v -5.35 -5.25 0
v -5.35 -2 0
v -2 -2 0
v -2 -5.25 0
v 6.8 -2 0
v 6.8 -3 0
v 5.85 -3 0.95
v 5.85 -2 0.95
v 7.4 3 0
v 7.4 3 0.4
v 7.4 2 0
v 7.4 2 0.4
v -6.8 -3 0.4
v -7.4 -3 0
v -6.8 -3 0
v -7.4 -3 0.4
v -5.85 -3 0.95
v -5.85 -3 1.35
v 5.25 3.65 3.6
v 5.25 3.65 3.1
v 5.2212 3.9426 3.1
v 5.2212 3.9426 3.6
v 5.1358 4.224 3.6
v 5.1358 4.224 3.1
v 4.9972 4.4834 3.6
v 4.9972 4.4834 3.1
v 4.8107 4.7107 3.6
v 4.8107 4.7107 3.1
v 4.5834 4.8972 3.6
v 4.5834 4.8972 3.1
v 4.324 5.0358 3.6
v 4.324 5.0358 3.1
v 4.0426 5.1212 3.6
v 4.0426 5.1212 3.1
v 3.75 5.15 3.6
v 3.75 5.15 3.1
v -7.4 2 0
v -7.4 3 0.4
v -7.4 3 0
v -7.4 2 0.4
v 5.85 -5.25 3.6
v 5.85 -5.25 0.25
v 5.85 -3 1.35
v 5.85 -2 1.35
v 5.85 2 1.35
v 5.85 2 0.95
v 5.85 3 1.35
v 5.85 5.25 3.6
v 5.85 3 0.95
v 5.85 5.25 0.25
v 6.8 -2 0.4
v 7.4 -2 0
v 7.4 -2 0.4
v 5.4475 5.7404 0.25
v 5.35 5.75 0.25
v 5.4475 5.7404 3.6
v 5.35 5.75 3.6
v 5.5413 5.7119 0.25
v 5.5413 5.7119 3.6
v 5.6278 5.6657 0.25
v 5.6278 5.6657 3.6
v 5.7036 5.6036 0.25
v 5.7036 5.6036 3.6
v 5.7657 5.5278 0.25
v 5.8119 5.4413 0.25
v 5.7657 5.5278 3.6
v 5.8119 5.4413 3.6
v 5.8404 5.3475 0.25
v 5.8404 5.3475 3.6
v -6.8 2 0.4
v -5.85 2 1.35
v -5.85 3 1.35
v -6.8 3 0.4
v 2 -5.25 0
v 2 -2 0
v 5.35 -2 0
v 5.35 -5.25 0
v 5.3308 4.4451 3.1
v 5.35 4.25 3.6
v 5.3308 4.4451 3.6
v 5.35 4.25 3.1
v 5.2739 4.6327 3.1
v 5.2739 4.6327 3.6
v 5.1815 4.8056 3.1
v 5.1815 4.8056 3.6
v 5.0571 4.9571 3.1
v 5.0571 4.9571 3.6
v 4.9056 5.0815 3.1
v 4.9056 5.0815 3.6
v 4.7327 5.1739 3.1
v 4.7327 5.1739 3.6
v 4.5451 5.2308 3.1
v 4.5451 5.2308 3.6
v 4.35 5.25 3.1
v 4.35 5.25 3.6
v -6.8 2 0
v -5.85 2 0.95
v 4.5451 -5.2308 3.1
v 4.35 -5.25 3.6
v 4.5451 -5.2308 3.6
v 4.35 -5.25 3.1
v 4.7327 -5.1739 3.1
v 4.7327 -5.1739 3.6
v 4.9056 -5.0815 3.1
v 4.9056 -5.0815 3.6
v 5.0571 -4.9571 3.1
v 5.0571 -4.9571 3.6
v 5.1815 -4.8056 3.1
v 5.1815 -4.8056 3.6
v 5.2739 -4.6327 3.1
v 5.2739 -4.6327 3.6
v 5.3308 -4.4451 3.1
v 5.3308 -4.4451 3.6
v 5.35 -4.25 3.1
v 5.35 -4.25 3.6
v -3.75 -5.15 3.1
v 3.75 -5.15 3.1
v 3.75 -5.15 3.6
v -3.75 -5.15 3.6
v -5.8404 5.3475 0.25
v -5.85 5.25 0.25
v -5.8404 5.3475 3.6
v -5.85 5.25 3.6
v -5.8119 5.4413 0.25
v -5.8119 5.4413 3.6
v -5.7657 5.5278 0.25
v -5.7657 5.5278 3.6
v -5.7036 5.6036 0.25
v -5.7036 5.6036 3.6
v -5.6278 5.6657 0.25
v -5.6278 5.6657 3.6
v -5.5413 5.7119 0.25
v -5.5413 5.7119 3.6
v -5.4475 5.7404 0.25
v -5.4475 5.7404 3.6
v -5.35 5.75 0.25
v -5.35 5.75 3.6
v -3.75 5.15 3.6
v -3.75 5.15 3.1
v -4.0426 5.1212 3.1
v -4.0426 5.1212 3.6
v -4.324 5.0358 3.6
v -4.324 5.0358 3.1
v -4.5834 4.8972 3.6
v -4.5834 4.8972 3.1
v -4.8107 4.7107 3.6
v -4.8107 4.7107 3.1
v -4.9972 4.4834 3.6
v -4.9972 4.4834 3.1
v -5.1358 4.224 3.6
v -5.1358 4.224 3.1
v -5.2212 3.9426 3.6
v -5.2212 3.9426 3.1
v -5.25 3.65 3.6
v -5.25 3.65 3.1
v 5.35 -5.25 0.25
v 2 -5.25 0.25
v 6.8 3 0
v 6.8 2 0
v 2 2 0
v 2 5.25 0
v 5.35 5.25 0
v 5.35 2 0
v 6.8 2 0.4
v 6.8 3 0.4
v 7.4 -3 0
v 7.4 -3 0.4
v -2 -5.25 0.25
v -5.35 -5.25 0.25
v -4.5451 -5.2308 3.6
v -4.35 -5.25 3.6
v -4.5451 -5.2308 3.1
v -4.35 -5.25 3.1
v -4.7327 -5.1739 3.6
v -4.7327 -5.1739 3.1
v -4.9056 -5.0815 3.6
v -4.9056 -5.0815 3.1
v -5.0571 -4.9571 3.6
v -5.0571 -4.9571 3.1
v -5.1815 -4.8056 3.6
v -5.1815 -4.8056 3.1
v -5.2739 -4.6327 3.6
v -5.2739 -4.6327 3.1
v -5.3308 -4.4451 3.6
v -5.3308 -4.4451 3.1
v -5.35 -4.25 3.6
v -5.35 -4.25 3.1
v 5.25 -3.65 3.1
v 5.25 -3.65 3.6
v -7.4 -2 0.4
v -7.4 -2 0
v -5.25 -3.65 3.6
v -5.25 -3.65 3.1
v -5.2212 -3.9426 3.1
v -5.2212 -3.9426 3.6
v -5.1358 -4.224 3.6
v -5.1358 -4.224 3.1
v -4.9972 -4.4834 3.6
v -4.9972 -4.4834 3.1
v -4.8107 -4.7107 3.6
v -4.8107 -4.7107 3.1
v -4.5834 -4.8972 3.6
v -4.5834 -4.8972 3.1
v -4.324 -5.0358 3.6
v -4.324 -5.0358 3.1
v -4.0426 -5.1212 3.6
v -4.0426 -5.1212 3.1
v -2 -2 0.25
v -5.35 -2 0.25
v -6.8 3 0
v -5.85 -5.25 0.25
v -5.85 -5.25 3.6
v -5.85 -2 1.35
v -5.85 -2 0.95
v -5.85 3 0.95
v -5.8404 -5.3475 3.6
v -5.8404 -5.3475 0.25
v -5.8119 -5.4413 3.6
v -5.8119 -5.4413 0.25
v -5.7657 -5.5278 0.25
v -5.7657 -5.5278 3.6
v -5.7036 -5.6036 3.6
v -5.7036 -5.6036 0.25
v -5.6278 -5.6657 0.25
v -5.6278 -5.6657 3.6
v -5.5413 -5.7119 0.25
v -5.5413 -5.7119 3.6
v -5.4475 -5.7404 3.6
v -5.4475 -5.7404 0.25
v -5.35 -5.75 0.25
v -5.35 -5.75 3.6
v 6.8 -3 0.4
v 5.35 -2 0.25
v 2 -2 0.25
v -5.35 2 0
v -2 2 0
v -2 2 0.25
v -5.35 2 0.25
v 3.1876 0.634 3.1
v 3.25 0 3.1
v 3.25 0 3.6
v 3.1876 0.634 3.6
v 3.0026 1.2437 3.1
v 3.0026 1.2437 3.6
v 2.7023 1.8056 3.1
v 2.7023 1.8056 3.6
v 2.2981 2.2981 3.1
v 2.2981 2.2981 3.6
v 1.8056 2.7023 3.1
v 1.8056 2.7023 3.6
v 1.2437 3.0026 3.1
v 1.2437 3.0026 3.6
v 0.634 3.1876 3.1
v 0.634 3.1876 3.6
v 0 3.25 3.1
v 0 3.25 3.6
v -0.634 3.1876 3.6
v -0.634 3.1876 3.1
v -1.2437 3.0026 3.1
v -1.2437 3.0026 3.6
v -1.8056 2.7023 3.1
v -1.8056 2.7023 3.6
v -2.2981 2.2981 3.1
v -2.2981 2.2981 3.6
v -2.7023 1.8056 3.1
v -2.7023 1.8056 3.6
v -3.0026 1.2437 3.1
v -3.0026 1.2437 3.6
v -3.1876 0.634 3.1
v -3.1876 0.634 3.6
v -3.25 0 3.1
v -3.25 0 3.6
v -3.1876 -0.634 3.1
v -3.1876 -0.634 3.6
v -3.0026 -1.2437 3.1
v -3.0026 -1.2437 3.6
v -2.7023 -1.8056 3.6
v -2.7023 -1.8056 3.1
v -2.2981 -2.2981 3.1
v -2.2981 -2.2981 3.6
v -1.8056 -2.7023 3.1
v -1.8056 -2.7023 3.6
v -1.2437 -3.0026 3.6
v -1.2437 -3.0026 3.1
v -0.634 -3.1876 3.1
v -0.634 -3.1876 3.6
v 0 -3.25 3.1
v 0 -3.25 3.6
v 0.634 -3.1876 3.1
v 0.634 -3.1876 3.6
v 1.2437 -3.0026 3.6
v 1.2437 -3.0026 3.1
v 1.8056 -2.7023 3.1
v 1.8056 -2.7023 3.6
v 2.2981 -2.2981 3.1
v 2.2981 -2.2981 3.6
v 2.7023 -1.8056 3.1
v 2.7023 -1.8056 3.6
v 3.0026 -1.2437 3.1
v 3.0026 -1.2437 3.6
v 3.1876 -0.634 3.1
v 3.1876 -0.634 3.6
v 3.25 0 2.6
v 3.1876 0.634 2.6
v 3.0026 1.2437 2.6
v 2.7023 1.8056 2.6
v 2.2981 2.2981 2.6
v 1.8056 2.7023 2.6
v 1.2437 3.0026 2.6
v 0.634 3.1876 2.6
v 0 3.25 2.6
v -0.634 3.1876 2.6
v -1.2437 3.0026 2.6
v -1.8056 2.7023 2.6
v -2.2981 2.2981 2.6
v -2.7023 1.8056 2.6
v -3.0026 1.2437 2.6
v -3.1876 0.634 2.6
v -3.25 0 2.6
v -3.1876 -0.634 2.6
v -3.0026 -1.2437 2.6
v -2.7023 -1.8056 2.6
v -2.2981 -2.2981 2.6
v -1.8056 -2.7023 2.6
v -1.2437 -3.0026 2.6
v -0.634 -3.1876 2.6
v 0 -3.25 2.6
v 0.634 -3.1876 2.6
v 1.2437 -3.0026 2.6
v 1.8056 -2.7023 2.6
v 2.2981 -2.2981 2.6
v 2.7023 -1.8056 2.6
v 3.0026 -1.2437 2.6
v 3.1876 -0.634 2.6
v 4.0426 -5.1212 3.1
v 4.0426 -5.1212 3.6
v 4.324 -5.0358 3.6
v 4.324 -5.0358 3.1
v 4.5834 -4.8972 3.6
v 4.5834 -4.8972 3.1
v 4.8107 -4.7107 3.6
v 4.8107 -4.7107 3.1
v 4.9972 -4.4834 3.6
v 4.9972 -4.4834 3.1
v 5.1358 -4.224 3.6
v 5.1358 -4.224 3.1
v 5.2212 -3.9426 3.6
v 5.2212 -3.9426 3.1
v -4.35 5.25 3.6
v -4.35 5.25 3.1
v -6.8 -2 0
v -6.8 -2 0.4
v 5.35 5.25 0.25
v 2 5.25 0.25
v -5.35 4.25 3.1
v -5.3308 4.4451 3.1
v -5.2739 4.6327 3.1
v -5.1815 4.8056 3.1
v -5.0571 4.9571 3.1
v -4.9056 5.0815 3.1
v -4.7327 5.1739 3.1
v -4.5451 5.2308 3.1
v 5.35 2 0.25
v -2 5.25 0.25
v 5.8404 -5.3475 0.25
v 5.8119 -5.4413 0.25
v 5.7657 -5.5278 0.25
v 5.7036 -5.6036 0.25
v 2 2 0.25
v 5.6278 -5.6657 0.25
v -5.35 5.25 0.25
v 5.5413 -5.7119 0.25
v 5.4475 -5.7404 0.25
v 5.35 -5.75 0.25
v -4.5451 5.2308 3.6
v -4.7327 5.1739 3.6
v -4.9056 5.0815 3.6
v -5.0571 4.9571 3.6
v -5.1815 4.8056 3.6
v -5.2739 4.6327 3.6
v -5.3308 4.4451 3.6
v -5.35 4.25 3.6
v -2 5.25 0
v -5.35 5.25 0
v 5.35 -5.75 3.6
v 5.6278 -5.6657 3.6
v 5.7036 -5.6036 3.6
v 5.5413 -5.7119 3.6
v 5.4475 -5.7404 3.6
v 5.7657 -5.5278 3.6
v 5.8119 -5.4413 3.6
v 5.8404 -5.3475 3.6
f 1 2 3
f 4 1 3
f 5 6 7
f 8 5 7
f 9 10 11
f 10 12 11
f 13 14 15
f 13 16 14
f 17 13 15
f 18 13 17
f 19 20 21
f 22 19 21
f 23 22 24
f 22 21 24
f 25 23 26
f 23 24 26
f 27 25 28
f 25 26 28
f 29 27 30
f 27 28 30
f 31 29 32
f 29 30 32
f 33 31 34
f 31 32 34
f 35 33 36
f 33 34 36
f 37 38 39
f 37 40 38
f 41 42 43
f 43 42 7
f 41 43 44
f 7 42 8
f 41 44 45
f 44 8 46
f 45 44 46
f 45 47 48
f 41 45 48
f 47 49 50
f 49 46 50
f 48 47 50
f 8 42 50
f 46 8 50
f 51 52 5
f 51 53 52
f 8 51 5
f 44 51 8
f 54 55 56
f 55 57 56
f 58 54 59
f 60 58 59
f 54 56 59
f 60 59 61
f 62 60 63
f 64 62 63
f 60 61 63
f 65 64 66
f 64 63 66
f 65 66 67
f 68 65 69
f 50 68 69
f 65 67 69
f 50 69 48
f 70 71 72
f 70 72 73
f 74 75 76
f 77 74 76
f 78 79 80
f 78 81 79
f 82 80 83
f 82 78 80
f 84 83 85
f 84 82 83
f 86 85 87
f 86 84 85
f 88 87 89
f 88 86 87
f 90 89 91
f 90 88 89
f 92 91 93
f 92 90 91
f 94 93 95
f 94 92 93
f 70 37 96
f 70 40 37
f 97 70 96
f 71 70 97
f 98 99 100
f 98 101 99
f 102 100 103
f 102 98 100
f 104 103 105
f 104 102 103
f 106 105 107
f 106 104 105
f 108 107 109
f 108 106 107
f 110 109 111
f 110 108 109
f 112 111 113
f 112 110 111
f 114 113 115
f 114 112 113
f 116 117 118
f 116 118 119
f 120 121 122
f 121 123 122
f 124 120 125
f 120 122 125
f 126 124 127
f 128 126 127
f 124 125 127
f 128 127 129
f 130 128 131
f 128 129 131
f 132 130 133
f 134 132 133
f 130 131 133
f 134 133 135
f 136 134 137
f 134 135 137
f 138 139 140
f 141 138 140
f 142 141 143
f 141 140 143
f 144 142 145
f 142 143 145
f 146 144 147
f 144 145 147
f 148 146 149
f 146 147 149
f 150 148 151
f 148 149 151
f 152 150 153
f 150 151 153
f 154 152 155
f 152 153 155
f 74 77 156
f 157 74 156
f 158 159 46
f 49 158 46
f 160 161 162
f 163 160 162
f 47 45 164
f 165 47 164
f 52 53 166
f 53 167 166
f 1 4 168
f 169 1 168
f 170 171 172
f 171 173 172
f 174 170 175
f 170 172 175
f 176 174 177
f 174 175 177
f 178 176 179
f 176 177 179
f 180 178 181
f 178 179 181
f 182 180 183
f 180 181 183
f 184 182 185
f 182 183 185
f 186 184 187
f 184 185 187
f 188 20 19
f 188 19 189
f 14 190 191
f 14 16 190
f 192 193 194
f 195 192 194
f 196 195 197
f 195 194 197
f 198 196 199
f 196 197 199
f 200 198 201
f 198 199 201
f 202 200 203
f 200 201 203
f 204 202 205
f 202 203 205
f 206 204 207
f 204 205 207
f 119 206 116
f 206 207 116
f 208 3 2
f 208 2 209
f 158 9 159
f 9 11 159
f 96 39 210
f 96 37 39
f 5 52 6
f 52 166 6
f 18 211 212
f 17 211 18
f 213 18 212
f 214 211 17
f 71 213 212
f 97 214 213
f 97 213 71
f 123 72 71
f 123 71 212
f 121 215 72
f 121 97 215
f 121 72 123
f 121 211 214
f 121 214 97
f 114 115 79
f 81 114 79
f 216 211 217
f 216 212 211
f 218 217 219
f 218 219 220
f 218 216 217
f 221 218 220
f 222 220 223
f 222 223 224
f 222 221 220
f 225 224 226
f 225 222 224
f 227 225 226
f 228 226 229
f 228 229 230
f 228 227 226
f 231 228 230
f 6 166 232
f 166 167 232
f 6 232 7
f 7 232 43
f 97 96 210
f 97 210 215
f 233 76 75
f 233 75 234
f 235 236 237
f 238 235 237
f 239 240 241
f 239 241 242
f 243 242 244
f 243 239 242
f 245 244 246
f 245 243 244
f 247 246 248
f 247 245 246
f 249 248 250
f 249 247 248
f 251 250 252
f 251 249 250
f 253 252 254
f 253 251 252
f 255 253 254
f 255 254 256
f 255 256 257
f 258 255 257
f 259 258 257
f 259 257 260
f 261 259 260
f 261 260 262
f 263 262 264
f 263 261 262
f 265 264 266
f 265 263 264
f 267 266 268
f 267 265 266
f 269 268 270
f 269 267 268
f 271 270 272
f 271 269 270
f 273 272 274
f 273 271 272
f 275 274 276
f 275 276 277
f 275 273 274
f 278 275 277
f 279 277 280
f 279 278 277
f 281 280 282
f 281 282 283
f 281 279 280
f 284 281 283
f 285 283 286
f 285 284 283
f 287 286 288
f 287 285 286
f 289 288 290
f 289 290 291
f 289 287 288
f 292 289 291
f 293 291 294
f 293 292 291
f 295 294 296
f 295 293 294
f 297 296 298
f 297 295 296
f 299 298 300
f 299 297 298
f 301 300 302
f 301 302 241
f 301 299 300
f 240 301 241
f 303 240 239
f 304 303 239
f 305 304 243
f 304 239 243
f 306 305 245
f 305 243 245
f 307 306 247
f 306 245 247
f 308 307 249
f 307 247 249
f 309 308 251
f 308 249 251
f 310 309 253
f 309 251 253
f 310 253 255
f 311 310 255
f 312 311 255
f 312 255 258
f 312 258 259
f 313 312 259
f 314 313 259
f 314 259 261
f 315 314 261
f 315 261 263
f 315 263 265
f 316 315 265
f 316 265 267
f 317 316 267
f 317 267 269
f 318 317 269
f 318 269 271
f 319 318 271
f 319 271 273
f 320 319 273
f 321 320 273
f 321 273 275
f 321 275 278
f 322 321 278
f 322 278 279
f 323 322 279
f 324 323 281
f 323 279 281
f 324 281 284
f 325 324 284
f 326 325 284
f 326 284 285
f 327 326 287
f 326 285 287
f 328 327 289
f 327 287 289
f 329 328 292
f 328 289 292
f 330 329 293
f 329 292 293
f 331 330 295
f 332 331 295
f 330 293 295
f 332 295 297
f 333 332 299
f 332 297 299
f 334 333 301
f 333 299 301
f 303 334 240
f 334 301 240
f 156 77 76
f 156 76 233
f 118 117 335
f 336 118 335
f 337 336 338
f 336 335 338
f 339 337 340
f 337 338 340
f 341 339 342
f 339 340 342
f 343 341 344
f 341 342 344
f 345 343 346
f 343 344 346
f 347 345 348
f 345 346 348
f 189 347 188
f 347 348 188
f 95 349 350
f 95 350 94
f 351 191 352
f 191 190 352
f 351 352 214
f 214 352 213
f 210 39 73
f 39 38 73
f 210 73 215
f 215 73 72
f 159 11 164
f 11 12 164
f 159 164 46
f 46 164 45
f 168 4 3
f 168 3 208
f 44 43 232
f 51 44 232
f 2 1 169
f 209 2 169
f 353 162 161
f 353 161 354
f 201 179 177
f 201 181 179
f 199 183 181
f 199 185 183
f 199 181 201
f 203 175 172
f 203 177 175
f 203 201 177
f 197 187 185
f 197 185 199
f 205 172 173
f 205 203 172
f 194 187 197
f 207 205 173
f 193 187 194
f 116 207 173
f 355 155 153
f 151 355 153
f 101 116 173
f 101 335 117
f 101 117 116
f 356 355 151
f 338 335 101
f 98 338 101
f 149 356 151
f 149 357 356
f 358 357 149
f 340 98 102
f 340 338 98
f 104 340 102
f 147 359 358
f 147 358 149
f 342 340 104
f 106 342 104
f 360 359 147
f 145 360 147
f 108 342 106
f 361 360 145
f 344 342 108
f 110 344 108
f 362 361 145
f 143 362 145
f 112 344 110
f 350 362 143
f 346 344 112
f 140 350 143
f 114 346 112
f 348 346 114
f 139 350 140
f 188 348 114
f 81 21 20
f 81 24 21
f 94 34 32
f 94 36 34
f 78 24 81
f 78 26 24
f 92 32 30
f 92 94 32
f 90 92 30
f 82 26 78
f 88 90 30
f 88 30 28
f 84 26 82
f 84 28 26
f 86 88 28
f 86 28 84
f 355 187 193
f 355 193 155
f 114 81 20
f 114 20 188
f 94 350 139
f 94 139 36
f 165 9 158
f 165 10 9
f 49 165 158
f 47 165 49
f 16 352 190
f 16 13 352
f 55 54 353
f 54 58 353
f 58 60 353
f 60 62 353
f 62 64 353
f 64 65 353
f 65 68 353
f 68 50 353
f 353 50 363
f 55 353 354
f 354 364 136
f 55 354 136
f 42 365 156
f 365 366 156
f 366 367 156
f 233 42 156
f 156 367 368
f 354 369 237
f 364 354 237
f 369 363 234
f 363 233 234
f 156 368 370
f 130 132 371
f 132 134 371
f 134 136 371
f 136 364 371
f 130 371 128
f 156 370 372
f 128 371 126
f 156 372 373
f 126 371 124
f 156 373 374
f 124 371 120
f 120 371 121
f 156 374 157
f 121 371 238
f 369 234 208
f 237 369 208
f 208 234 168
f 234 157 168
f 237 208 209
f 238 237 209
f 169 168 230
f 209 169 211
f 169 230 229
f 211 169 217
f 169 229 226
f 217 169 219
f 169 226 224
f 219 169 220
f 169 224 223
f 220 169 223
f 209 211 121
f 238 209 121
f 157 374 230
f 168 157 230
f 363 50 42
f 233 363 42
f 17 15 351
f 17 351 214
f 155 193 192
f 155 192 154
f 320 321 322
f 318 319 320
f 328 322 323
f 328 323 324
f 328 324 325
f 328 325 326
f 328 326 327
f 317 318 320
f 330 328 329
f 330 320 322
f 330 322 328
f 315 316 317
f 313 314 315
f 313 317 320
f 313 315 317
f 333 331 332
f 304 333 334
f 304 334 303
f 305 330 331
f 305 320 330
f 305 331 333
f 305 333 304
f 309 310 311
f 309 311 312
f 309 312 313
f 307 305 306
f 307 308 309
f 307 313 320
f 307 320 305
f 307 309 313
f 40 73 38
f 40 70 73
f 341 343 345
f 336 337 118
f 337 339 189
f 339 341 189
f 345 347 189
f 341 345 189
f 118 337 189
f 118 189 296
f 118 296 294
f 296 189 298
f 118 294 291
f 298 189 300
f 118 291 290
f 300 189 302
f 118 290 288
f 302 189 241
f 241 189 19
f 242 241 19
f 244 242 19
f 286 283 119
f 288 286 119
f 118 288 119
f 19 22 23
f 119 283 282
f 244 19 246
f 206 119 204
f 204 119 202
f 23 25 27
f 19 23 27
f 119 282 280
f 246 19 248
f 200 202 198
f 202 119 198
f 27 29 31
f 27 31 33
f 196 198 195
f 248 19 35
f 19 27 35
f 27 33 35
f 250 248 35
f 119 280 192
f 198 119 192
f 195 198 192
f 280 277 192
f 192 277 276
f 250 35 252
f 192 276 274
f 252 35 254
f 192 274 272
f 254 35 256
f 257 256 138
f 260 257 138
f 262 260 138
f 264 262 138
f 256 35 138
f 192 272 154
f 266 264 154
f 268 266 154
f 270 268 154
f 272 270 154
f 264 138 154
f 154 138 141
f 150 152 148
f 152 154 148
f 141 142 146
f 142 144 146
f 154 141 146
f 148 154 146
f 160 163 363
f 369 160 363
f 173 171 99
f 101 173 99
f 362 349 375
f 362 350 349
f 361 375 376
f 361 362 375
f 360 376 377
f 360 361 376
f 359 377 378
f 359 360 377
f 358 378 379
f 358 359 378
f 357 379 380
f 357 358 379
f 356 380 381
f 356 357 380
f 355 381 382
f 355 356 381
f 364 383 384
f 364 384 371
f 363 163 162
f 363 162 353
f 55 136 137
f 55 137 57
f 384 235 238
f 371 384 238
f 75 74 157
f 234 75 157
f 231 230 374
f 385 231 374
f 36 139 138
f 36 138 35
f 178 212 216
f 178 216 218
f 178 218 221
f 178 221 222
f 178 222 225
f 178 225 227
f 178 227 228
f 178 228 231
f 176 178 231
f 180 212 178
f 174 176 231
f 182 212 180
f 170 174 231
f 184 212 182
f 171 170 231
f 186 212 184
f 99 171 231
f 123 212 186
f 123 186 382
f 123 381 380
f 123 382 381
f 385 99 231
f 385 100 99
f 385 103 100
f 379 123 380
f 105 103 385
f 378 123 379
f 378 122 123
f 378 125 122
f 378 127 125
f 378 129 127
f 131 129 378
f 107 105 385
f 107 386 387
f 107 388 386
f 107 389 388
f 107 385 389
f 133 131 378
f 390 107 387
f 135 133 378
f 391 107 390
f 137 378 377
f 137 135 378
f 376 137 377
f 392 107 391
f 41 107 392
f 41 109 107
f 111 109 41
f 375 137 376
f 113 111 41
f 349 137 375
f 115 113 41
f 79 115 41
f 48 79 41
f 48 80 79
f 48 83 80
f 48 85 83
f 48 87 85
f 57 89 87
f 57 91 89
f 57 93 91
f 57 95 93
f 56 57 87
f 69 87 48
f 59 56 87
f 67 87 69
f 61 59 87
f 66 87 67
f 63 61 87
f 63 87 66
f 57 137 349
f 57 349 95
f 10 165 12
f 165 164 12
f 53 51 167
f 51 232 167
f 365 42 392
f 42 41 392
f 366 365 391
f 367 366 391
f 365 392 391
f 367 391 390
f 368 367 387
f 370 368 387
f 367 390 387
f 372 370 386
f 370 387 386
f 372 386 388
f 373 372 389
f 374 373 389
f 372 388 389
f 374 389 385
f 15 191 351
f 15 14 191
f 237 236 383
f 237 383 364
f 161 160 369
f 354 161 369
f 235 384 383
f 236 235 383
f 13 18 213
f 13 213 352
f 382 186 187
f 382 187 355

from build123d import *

# Parameters (mm, degrees)
SKETCH_W                     = 11.7
SKETCH_H                     = 11.5
PAD_DEPTH                    = 3.6
PAD001_DEPTH                 = 0.5
PAD001_LINEARPATTERN_2_DEPTH = 0.5
SKETCH002_W                  = 4
SKETCH002_H                  = 0.25
POCKET_DEPTH                 = 11.501
SKETCH003_W                  = 4
SKETCH003_H                  = 0.25
POCKET001_DEPTH              = 11.7
SKETCH005_W                  = 0.5
SKETCH005_H                  = 0.25
POCKET002_DEPTH              = 49.671669
SKETCH006_W                  = 0.5
SKETCH006_H                  = 0.25
POCKET003_DEPTH              = 51.421669
FILLET_R                     = 0.5
SKETCH007_R                  = 3.25
POCKET004_DEPTH              = 1
SKETCH008_W                  = 10.7
SKETCH008_H                  = 10.5
POCKET005_DEPTH              = 0.5
FILLET001_R                  = 1
SKETCH009_R                  = 3.25
PAD002_DEPTH                 = 0.5


with BuildPart() as part:
    # Sketch → Pad (new body)
    with BuildSketch(Plane.XY):
        Rectangle(SKETCH_W, SKETCH_H)
    extrude(amount=PAD_DEPTH)

    # Sketch001 (on DatumPlane) → Pad001 (join, symmetric)
    with BuildSketch(Plane.XZ.offset(2.5)):
        Polygon((-7.4, 0), (-6.8, 0), (-5.85, 0.95), (-5.85, 1.35), (-6.8, 0.4), (-7.4, 0.4), align=None)
    pad001 = extrude(amount=PAD001_DEPTH, both=True)

    # Sketch001 LinearPattern 2 → Pad001 LinearPattern 2 (add, symmetric)
    with BuildSketch(Plane.XZ.offset(-2.5)):
        Polygon((-7.4, 0), (-6.8, 0), (-5.85, 0.95), (-5.85, 1.35), (-6.8, 0.4), (-7.4, 0.4), align=None)
    pad001_linearpattern_2 = extrude(amount=PAD001_LINEARPATTERN_2_DEPTH, both=True)

    # Mirrored: Pad001, Pad001 LinearPattern 2 across Sketch001 V_Axis
    add(pad001.mirror(Plane(origin=(0, -2.5, 0), x_dir=(0, -1, 0), z_dir=(1, 0, 0))))
    add(pad001_linearpattern_2.mirror(Plane(origin=(0, -2.5, 0), x_dir=(0, -1, 0), z_dir=(1, 0, 0))))

    # Sketch002 (on Face6 of MultiTransform) → Pocket (cut, through all)
    with BuildSketch(Plane.XZ.offset(5.75)):
        with Locations((0, 0.125)):
            Rectangle(SKETCH002_W, SKETCH002_H)
    extrude(amount=-POCKET_DEPTH, mode=Mode.SUBTRACT)

    # Sketch003 (on Face7 of Pocket) → Pocket001 (cut)
    with BuildSketch(Plane.YZ.offset(5.85)):
        with Locations((0, 0.125)):
            Rectangle(SKETCH003_W, SKETCH003_H)
    extrude(amount=-POCKET001_DEPTH, mode=Mode.SUBTRACT)

    # Sketch005 (on Face11 of Pocket001) → Pocket002 (cut, through all)
    with BuildSketch(Plane.XZ.offset(5.75)):
        with Locations((5.6, 0.125)):
            Rectangle(SKETCH005_W, SKETCH005_H)
    pocket002 = extrude(amount=-POCKET002_DEPTH, mode=Mode.SUBTRACT)

    # Mirrored001: Pocket002 across Sketch005 V_Axis
    add(pocket002.mirror(Plane(origin=(0, -5.75, 0), x_dir=(0, -1, 0), z_dir=(1, 0, 0))), mode=Mode.SUBTRACT)

    # Sketch006 (on Face11 of Mirrored001) → Pocket003 (cut, through all)
    with BuildSketch(Plane.YZ.offset(5.85)):
        with Locations((-5.5, 0.125)):
            Rectangle(SKETCH006_W, SKETCH006_H)
    pocket003 = extrude(amount=-POCKET003_DEPTH, mode=Mode.SUBTRACT)

    # Mirrored002: Pocket003 across Sketch006 V_Axis
    add(pocket003.mirror(Plane(origin=(5.85, 0, 0), x_dir=(1, 0, 0), z_dir=(0, 1, 0))), mode=Mode.SUBTRACT)

    # Fillet
    fillet_edges = [part.edges().sort_by_distance(p)[0] for p in [
        (5.85, -5.75, 1.925),
        (5.85, 5.75, 1.925),
        (-5.85, -5.75, 1.925),
        (-5.85, 5.75, 1.925),
    ]]
    fillet(fillet_edges, radius=FILLET_R)

    # Sketch007 (on Face5 of Fillet) → Pocket004 (cut)
    with BuildSketch(Plane.XY.offset(3.6)):
        Circle(SKETCH007_R)
    extrude(amount=-POCKET004_DEPTH, mode=Mode.SUBTRACT)

    # Sketch008 (on Face5 of Pocket004) → Pocket005 (cut)
    with BuildSketch(Plane.XY.offset(3.6)):
        Rectangle(SKETCH008_W, SKETCH008_H)
    extrude(amount=-POCKET005_DEPTH, mode=Mode.SUBTRACT)

    # Fillet001
    fillet001_edges = [part.edges().sort_by_distance(p)[0] for p in [
        (-5.35, 5.25, 3.35),
        (5.35, 5.25, 3.35),
        (5.35, -5.25, 3.35),
        (-5.35, -5.25, 3.35),
    ]]
    fillet(fillet001_edges, radius=FILLET001_R)

    # Sketch009 (on Face18 of Fillet001) → Pad002 (join)
    with BuildSketch(Plane.XY.offset(3.1)):
        with BuildLine():
            Line((-3.75, 5.15), (3.75, 5.15))
            ThreePointArc((5.25, 3.65), (4.81066, 4.71066), (3.75, 5.15))
            Line((5.25, 3.65), (5.25, -3.65))
            ThreePointArc((3.75, -5.15), (4.81066, -4.71066), (5.25, -3.65))
            Line((3.75, -5.15), (-3.75, -5.15))
            ThreePointArc((-5.25, -3.65), (-4.81066, -4.71066), (-3.75, -5.15))
            Line((-5.25, -3.65), (-5.25, 3.65))
            ThreePointArc((-3.75, 5.15), (-4.81066, 4.71066), (-5.25, 3.65))
        make_face()
        Circle(SKETCH009_R, mode=Mode.SUBTRACT)
    extrude(amount=PAD002_DEPTH)


solid = part.part
